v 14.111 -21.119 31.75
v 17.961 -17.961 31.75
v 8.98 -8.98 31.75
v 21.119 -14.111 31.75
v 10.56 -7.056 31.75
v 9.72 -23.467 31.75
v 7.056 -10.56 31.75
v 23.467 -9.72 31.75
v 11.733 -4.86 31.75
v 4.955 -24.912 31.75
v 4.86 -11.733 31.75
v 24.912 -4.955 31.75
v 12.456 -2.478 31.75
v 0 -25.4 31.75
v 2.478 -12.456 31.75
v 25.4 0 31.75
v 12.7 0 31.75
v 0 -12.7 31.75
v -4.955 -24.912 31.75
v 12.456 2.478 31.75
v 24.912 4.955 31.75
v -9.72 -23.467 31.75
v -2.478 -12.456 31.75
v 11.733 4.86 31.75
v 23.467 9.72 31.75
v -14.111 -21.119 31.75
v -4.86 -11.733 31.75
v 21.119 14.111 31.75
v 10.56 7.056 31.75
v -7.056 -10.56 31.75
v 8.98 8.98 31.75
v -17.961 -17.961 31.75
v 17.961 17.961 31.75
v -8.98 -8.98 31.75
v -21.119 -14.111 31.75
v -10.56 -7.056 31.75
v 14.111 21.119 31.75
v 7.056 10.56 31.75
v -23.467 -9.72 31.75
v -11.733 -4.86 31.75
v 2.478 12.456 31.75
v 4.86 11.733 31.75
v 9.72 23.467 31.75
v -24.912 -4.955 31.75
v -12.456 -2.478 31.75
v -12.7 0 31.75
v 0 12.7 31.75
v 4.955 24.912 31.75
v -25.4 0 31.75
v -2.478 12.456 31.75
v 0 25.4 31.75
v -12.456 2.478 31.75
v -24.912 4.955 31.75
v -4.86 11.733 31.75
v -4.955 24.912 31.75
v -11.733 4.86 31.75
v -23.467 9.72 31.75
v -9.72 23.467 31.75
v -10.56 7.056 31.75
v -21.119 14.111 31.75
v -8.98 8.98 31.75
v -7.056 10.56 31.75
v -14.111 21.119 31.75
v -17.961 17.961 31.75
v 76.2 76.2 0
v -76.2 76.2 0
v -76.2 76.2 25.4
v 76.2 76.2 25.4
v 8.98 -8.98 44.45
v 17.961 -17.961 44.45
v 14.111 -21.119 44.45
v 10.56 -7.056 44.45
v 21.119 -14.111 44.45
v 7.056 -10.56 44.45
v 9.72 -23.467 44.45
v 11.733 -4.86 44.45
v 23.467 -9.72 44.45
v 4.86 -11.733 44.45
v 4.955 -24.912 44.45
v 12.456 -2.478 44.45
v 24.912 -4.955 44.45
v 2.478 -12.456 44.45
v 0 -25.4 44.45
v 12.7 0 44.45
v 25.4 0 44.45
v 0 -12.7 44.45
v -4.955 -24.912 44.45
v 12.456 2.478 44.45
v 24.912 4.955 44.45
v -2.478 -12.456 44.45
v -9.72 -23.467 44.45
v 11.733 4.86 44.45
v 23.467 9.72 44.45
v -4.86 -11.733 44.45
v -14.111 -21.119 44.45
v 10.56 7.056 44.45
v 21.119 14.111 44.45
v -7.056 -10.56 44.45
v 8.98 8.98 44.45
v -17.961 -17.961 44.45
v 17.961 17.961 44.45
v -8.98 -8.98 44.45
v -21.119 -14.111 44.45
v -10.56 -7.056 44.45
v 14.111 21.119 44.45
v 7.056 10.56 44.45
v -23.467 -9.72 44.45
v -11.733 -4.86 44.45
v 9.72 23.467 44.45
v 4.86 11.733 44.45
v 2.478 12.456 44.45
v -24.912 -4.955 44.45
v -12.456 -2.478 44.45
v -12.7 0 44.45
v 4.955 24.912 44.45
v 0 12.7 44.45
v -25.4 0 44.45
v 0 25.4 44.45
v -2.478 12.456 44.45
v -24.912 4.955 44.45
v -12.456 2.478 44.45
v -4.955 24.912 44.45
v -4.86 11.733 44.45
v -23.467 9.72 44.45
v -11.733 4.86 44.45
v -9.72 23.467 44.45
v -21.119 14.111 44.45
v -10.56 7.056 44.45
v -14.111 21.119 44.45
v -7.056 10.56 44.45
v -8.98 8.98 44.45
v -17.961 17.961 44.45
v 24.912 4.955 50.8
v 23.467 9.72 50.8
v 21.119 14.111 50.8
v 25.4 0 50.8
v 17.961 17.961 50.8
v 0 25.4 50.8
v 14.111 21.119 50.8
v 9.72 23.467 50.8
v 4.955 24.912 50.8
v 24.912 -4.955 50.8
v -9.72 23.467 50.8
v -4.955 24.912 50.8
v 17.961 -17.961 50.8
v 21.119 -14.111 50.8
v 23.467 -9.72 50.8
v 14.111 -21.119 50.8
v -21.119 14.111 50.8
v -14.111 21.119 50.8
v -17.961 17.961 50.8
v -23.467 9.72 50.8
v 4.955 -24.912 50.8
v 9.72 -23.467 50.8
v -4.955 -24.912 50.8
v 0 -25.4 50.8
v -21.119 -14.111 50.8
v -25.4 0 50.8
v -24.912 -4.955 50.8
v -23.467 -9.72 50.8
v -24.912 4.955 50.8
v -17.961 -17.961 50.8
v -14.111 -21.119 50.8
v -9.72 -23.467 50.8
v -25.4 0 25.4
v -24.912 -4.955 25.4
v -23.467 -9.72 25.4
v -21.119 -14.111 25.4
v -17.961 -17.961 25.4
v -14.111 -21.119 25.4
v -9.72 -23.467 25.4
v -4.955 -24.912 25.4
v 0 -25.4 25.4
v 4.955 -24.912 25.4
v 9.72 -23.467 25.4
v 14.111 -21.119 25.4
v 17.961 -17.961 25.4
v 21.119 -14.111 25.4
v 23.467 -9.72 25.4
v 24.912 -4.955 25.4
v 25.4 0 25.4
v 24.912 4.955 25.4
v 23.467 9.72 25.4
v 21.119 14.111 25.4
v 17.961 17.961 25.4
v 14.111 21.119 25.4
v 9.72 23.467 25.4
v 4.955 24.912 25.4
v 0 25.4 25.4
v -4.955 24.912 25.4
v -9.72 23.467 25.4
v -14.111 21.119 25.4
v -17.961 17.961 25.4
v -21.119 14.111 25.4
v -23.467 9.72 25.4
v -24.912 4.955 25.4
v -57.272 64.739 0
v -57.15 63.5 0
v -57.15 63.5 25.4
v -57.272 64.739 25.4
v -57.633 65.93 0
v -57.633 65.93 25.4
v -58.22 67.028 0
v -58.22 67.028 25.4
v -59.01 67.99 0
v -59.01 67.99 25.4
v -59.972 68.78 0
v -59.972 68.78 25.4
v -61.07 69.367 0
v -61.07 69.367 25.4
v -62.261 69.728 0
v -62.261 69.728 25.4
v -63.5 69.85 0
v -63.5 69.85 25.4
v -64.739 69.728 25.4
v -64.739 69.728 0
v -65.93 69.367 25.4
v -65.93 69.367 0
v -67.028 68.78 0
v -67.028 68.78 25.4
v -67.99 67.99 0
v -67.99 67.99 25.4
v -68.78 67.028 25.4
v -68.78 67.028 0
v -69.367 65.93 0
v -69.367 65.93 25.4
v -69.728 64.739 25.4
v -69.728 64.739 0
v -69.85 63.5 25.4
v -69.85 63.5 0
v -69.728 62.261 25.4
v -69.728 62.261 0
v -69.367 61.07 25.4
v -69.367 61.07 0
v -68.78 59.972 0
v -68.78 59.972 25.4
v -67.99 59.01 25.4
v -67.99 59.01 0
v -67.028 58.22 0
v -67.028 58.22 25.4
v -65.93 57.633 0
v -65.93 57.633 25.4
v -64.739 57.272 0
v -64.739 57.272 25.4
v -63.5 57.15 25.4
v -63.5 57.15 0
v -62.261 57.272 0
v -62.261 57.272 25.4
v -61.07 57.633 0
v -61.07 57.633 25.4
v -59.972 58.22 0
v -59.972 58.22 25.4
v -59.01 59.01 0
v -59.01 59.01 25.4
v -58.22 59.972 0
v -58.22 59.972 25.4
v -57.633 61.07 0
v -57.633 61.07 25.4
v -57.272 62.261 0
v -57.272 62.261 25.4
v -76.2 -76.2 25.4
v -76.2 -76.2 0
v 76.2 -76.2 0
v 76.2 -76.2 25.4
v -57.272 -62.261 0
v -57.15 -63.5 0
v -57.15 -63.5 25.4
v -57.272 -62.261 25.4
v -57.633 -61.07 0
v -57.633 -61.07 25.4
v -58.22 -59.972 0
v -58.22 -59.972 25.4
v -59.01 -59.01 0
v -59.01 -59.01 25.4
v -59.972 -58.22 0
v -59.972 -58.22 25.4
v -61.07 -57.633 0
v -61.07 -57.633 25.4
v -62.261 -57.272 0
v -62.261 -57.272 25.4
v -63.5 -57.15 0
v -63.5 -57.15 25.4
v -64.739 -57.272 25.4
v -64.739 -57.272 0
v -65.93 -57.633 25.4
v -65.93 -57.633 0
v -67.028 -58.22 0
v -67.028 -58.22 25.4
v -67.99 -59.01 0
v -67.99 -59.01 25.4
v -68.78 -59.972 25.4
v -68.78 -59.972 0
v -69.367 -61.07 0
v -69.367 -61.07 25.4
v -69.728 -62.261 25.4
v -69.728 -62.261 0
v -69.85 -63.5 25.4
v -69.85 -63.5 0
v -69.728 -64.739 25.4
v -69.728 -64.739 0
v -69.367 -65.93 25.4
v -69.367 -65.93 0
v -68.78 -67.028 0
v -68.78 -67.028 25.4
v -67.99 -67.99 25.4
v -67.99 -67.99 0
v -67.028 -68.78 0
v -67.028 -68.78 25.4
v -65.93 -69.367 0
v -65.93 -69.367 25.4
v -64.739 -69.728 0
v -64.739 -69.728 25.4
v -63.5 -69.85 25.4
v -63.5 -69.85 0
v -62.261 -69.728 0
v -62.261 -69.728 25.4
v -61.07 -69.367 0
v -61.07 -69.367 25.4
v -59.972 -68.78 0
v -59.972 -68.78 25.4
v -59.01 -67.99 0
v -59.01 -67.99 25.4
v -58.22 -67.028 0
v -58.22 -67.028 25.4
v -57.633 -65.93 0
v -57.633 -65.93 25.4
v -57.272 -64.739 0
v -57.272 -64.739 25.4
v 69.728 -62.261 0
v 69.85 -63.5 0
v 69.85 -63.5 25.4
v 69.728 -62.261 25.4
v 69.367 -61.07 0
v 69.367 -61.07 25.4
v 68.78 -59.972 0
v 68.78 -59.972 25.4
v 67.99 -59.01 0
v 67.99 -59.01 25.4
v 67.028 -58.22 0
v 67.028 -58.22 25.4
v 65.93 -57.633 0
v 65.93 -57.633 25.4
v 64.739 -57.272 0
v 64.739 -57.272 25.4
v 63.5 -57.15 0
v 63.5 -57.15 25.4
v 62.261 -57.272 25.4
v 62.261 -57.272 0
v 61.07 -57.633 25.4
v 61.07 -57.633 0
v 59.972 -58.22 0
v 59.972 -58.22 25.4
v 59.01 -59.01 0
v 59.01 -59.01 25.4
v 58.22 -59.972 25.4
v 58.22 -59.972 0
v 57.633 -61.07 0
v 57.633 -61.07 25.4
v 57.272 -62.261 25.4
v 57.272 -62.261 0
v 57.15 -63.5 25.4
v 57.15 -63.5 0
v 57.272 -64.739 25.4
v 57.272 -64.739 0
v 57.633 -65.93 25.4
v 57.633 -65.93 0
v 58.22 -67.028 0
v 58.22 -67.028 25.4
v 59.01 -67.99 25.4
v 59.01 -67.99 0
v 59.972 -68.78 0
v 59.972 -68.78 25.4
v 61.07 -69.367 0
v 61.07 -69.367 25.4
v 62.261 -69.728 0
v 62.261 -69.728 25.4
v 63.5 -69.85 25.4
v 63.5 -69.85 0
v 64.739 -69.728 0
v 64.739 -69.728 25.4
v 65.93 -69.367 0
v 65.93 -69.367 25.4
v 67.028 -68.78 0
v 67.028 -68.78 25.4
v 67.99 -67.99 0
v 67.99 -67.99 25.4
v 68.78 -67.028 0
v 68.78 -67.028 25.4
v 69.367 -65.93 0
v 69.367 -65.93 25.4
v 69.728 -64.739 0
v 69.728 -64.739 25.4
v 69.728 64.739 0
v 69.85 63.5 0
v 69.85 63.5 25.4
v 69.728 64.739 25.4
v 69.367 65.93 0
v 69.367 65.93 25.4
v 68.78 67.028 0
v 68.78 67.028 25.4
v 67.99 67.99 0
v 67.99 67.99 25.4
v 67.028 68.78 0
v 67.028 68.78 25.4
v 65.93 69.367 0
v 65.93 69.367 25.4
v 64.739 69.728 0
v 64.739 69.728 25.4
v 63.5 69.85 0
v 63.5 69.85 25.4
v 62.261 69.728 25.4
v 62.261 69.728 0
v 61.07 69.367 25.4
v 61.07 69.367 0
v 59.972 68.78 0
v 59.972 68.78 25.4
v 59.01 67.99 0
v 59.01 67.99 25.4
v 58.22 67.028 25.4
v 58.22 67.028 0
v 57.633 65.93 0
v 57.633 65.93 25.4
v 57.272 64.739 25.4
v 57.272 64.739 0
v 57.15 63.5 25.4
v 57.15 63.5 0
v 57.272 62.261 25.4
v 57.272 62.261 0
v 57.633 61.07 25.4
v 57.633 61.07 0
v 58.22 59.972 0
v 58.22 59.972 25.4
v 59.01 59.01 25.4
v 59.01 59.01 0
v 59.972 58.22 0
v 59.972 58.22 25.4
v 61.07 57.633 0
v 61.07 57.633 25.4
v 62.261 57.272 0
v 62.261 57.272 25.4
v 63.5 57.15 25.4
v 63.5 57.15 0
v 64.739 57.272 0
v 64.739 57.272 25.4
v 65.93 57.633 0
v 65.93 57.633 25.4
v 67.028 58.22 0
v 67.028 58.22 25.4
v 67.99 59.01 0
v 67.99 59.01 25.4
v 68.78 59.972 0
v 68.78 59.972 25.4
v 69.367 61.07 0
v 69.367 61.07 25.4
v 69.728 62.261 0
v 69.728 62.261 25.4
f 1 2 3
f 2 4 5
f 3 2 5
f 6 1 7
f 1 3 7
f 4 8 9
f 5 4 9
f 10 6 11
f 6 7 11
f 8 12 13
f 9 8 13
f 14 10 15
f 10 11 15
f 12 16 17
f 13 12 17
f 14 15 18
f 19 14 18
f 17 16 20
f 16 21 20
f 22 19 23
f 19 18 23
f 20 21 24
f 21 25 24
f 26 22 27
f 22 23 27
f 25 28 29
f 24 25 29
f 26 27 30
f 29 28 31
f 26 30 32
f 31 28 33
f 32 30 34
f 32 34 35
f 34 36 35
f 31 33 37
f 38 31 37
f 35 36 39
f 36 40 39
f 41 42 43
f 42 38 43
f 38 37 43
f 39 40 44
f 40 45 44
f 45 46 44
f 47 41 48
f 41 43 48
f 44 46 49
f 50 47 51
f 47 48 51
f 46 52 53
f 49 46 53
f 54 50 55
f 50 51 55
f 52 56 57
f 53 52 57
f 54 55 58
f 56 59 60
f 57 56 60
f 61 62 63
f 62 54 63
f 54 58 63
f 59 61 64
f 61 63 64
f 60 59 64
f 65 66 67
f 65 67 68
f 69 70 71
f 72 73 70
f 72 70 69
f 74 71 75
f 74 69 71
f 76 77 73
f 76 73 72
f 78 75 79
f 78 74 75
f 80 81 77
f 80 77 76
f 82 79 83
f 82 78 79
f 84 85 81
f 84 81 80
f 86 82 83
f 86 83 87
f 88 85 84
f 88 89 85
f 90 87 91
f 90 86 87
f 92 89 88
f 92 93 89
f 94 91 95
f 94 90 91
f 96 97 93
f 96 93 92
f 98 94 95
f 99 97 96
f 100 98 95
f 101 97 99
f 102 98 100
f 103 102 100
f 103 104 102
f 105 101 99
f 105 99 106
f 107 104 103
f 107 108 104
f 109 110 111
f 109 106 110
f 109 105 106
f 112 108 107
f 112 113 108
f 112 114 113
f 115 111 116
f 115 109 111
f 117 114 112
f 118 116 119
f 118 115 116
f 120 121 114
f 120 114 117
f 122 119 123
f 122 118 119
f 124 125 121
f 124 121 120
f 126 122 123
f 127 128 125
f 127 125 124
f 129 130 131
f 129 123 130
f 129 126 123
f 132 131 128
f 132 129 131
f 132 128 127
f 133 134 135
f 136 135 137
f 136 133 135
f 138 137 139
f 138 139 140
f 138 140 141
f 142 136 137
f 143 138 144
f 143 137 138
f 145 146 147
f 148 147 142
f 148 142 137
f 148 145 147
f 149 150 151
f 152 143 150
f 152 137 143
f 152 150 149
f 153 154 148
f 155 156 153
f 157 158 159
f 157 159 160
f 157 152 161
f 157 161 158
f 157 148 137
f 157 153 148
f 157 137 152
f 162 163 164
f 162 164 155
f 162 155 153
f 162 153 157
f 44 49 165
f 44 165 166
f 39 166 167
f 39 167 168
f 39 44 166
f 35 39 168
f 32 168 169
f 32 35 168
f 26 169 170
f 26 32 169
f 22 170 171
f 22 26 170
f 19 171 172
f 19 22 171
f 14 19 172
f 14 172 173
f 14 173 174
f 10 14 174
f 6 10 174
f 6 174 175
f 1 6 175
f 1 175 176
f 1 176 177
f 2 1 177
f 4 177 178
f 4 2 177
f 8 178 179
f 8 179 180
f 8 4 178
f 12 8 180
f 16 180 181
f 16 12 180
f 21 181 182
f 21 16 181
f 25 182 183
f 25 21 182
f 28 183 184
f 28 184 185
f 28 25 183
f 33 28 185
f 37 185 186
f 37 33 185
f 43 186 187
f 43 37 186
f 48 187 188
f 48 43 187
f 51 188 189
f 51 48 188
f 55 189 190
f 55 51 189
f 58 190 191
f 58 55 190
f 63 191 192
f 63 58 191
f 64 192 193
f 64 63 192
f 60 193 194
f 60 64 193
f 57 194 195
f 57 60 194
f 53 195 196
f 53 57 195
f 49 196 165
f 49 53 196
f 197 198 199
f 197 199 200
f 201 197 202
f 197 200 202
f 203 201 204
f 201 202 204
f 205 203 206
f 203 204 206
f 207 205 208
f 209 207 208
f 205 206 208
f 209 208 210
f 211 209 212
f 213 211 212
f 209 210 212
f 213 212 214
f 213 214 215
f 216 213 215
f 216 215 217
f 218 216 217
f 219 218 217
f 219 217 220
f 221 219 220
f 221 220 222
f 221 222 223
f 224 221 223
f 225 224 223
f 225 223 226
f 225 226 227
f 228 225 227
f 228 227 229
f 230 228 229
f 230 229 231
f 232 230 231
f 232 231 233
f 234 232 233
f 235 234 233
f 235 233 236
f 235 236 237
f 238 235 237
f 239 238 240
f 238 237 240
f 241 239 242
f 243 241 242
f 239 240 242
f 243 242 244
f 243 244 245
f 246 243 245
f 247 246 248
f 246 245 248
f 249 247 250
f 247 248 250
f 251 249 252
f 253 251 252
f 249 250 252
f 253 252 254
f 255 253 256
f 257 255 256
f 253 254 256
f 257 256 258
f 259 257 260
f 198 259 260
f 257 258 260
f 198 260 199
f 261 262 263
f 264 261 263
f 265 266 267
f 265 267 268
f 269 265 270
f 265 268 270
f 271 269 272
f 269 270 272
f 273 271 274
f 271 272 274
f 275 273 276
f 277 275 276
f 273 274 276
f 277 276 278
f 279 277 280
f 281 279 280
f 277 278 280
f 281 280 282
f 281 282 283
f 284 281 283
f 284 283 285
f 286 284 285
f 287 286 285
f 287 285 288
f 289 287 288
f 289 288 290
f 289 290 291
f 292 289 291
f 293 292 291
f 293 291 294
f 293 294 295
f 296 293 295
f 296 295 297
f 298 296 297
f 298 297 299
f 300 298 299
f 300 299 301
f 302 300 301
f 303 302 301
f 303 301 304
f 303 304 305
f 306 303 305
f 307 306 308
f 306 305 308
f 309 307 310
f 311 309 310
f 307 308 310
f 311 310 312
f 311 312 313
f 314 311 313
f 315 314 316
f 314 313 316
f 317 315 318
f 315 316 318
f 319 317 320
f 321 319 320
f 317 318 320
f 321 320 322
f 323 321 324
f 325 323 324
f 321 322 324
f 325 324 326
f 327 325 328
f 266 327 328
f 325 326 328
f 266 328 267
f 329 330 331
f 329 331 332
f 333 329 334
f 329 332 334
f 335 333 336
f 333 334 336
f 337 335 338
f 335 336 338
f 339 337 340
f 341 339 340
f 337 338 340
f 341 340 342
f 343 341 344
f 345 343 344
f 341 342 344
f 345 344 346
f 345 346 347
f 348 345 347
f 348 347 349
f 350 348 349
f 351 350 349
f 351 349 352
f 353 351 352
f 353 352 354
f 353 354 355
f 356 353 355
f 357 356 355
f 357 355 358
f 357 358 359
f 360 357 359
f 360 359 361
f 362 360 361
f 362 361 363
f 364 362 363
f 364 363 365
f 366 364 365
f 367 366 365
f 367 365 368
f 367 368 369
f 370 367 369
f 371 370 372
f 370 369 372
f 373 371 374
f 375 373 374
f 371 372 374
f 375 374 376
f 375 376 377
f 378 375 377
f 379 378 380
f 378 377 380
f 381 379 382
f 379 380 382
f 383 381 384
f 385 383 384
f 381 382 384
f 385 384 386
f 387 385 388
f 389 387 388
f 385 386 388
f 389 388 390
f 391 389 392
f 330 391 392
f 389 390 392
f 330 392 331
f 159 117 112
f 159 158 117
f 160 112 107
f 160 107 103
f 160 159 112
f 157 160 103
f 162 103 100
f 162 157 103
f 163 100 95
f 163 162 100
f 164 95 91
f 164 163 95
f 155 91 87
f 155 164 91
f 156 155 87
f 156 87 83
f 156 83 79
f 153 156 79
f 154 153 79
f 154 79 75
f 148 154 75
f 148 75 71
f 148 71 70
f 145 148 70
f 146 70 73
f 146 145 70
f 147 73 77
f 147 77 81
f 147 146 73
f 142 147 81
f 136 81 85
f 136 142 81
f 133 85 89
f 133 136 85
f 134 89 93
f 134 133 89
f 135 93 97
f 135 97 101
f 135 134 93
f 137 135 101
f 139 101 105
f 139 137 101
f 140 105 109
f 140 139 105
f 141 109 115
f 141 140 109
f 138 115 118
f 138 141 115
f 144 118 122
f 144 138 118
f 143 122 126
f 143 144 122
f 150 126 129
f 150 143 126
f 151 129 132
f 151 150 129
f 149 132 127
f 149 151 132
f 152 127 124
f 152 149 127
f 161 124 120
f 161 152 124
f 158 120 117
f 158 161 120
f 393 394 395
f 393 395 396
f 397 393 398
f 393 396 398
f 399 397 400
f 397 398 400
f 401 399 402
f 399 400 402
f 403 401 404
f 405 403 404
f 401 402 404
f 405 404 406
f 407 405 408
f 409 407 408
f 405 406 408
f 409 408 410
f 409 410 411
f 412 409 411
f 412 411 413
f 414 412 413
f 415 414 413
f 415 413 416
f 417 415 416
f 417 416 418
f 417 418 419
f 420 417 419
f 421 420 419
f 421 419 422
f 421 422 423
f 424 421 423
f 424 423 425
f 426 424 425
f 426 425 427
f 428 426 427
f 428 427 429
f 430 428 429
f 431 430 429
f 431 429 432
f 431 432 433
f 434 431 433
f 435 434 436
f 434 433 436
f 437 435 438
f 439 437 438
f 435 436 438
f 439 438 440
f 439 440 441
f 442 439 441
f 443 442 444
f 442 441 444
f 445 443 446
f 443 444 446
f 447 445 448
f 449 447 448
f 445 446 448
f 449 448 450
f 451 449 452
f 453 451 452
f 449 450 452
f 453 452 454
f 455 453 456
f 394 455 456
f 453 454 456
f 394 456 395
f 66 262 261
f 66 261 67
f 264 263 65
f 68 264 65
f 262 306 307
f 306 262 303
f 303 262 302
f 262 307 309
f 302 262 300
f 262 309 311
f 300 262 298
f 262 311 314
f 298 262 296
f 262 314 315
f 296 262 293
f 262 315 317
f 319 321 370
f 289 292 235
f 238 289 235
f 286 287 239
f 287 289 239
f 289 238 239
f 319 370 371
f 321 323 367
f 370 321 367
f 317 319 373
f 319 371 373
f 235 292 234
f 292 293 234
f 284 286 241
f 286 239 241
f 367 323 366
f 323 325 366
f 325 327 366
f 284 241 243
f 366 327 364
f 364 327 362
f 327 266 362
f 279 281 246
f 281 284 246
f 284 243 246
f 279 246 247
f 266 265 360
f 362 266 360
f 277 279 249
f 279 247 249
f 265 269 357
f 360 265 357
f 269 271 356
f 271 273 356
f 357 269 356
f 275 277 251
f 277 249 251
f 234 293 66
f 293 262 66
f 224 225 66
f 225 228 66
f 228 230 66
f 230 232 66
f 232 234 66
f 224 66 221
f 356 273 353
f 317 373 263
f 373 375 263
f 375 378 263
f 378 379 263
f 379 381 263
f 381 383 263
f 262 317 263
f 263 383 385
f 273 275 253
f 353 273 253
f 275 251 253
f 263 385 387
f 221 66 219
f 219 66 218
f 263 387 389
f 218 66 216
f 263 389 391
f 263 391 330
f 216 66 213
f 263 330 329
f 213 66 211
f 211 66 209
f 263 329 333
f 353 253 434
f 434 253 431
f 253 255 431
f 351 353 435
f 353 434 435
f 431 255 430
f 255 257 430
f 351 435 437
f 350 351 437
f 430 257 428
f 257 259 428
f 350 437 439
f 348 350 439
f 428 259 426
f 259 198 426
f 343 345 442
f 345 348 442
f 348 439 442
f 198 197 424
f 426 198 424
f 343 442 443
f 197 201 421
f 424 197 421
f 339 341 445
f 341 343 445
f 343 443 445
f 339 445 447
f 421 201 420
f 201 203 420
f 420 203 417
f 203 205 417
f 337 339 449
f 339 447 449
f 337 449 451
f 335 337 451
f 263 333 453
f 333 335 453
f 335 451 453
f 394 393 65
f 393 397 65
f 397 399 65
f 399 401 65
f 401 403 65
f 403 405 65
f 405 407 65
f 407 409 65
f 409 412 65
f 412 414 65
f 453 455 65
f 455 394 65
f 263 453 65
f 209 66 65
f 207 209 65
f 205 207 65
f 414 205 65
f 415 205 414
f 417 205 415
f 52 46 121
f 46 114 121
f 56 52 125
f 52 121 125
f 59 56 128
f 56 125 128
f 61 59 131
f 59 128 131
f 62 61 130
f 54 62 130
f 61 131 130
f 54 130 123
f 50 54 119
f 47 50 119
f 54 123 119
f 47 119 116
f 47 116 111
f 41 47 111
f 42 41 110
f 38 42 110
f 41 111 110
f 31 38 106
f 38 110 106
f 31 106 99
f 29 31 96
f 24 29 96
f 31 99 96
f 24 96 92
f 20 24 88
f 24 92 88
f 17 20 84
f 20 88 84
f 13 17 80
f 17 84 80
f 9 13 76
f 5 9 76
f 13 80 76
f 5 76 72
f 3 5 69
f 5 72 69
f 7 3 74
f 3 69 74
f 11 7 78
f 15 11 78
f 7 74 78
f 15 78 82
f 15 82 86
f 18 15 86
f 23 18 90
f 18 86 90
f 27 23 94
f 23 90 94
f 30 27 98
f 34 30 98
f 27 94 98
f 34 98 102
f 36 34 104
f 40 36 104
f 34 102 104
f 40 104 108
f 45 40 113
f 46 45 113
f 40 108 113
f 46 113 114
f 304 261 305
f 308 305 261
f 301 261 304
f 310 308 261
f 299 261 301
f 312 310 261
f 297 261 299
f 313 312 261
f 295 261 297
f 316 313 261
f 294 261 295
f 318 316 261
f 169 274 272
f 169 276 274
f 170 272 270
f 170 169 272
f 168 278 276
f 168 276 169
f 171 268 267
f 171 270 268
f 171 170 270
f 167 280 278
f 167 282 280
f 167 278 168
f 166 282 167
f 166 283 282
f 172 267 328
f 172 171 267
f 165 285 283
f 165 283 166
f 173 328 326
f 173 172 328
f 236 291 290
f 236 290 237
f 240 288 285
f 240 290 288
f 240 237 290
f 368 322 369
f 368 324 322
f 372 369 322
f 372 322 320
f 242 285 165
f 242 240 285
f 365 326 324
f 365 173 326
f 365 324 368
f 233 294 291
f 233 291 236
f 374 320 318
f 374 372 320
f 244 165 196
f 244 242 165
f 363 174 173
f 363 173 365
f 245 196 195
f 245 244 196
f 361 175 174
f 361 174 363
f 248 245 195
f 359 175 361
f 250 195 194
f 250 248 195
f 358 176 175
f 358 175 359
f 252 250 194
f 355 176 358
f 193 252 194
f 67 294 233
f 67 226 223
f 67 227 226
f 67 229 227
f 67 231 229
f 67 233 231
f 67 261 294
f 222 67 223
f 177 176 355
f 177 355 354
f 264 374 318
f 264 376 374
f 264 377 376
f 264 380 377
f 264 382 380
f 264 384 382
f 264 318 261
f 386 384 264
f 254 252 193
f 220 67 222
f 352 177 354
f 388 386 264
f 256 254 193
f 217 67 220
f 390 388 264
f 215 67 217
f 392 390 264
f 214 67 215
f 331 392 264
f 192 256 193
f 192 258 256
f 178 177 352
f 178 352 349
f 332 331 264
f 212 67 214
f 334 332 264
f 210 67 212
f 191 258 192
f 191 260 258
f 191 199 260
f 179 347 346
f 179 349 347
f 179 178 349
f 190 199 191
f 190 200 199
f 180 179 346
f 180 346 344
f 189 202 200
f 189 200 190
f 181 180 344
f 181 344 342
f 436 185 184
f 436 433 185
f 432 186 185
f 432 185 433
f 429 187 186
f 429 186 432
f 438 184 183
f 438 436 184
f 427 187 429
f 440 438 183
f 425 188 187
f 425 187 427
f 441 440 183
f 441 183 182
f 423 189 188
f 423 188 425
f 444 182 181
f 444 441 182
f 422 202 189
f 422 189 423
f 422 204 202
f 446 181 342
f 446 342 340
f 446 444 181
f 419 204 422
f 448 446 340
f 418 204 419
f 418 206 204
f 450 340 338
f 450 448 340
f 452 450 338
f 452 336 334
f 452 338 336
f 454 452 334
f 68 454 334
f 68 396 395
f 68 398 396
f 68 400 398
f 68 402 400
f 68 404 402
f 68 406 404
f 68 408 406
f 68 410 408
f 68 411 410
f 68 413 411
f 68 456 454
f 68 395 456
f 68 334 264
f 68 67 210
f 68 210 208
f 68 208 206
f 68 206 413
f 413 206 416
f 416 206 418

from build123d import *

# Parameters (mm, degrees)
F0_W     = 152.4
F0_H     = 152.4
F1_DEPTH = 25.4
F2_R     = 6.35
F3_DEPTH = 25.401
F4_W     = 25.4
F4_H     = 25.4
F6_W     = 25.4
F6_H     = 12.7


with BuildPart() as f1:
    # F0 (on Top) → F1 (new body)
    with BuildSketch(Plane.XY):
        Rectangle(F0_W, F0_H)
    extrude(amount=F1_DEPTH)

    # F2 (on face) → F3 (cut, through all)
    with BuildSketch(Plane.XY.offset(25.4)):
        with Locations((-63.5, 63.5)):
            Circle(F2_R)
        with Locations((63.5, 63.5)):
            Circle(F2_R)
        with Locations((63.5, -63.5)):
            Circle(F2_R)
        with Locations((-63.5, -63.5)):
            Circle(F2_R)
    extrude(amount=-F3_DEPTH, mode=Mode.SUBTRACT)

    # F4 (on Front) → F5 (revolve)
    with BuildSketch(Plane.XZ):
        with Locations((-12.7, 38.1)):
            Rectangle(F4_W, F4_H)
    revolve(axis=Axis((0, 0, 38.1), (0, 0, 1)))

    # F6 (on Front) → F7 (revolve, cut)
    with BuildSketch(Plane.XZ):
        with Locations((-25.4, 38.1)):
            Rectangle(F6_W, F6_H)
    revolve(axis=Axis((0, 0, 50.8), (0, 0, -1)), mode=Mode.SUBTRACT)


solid = f1.part
